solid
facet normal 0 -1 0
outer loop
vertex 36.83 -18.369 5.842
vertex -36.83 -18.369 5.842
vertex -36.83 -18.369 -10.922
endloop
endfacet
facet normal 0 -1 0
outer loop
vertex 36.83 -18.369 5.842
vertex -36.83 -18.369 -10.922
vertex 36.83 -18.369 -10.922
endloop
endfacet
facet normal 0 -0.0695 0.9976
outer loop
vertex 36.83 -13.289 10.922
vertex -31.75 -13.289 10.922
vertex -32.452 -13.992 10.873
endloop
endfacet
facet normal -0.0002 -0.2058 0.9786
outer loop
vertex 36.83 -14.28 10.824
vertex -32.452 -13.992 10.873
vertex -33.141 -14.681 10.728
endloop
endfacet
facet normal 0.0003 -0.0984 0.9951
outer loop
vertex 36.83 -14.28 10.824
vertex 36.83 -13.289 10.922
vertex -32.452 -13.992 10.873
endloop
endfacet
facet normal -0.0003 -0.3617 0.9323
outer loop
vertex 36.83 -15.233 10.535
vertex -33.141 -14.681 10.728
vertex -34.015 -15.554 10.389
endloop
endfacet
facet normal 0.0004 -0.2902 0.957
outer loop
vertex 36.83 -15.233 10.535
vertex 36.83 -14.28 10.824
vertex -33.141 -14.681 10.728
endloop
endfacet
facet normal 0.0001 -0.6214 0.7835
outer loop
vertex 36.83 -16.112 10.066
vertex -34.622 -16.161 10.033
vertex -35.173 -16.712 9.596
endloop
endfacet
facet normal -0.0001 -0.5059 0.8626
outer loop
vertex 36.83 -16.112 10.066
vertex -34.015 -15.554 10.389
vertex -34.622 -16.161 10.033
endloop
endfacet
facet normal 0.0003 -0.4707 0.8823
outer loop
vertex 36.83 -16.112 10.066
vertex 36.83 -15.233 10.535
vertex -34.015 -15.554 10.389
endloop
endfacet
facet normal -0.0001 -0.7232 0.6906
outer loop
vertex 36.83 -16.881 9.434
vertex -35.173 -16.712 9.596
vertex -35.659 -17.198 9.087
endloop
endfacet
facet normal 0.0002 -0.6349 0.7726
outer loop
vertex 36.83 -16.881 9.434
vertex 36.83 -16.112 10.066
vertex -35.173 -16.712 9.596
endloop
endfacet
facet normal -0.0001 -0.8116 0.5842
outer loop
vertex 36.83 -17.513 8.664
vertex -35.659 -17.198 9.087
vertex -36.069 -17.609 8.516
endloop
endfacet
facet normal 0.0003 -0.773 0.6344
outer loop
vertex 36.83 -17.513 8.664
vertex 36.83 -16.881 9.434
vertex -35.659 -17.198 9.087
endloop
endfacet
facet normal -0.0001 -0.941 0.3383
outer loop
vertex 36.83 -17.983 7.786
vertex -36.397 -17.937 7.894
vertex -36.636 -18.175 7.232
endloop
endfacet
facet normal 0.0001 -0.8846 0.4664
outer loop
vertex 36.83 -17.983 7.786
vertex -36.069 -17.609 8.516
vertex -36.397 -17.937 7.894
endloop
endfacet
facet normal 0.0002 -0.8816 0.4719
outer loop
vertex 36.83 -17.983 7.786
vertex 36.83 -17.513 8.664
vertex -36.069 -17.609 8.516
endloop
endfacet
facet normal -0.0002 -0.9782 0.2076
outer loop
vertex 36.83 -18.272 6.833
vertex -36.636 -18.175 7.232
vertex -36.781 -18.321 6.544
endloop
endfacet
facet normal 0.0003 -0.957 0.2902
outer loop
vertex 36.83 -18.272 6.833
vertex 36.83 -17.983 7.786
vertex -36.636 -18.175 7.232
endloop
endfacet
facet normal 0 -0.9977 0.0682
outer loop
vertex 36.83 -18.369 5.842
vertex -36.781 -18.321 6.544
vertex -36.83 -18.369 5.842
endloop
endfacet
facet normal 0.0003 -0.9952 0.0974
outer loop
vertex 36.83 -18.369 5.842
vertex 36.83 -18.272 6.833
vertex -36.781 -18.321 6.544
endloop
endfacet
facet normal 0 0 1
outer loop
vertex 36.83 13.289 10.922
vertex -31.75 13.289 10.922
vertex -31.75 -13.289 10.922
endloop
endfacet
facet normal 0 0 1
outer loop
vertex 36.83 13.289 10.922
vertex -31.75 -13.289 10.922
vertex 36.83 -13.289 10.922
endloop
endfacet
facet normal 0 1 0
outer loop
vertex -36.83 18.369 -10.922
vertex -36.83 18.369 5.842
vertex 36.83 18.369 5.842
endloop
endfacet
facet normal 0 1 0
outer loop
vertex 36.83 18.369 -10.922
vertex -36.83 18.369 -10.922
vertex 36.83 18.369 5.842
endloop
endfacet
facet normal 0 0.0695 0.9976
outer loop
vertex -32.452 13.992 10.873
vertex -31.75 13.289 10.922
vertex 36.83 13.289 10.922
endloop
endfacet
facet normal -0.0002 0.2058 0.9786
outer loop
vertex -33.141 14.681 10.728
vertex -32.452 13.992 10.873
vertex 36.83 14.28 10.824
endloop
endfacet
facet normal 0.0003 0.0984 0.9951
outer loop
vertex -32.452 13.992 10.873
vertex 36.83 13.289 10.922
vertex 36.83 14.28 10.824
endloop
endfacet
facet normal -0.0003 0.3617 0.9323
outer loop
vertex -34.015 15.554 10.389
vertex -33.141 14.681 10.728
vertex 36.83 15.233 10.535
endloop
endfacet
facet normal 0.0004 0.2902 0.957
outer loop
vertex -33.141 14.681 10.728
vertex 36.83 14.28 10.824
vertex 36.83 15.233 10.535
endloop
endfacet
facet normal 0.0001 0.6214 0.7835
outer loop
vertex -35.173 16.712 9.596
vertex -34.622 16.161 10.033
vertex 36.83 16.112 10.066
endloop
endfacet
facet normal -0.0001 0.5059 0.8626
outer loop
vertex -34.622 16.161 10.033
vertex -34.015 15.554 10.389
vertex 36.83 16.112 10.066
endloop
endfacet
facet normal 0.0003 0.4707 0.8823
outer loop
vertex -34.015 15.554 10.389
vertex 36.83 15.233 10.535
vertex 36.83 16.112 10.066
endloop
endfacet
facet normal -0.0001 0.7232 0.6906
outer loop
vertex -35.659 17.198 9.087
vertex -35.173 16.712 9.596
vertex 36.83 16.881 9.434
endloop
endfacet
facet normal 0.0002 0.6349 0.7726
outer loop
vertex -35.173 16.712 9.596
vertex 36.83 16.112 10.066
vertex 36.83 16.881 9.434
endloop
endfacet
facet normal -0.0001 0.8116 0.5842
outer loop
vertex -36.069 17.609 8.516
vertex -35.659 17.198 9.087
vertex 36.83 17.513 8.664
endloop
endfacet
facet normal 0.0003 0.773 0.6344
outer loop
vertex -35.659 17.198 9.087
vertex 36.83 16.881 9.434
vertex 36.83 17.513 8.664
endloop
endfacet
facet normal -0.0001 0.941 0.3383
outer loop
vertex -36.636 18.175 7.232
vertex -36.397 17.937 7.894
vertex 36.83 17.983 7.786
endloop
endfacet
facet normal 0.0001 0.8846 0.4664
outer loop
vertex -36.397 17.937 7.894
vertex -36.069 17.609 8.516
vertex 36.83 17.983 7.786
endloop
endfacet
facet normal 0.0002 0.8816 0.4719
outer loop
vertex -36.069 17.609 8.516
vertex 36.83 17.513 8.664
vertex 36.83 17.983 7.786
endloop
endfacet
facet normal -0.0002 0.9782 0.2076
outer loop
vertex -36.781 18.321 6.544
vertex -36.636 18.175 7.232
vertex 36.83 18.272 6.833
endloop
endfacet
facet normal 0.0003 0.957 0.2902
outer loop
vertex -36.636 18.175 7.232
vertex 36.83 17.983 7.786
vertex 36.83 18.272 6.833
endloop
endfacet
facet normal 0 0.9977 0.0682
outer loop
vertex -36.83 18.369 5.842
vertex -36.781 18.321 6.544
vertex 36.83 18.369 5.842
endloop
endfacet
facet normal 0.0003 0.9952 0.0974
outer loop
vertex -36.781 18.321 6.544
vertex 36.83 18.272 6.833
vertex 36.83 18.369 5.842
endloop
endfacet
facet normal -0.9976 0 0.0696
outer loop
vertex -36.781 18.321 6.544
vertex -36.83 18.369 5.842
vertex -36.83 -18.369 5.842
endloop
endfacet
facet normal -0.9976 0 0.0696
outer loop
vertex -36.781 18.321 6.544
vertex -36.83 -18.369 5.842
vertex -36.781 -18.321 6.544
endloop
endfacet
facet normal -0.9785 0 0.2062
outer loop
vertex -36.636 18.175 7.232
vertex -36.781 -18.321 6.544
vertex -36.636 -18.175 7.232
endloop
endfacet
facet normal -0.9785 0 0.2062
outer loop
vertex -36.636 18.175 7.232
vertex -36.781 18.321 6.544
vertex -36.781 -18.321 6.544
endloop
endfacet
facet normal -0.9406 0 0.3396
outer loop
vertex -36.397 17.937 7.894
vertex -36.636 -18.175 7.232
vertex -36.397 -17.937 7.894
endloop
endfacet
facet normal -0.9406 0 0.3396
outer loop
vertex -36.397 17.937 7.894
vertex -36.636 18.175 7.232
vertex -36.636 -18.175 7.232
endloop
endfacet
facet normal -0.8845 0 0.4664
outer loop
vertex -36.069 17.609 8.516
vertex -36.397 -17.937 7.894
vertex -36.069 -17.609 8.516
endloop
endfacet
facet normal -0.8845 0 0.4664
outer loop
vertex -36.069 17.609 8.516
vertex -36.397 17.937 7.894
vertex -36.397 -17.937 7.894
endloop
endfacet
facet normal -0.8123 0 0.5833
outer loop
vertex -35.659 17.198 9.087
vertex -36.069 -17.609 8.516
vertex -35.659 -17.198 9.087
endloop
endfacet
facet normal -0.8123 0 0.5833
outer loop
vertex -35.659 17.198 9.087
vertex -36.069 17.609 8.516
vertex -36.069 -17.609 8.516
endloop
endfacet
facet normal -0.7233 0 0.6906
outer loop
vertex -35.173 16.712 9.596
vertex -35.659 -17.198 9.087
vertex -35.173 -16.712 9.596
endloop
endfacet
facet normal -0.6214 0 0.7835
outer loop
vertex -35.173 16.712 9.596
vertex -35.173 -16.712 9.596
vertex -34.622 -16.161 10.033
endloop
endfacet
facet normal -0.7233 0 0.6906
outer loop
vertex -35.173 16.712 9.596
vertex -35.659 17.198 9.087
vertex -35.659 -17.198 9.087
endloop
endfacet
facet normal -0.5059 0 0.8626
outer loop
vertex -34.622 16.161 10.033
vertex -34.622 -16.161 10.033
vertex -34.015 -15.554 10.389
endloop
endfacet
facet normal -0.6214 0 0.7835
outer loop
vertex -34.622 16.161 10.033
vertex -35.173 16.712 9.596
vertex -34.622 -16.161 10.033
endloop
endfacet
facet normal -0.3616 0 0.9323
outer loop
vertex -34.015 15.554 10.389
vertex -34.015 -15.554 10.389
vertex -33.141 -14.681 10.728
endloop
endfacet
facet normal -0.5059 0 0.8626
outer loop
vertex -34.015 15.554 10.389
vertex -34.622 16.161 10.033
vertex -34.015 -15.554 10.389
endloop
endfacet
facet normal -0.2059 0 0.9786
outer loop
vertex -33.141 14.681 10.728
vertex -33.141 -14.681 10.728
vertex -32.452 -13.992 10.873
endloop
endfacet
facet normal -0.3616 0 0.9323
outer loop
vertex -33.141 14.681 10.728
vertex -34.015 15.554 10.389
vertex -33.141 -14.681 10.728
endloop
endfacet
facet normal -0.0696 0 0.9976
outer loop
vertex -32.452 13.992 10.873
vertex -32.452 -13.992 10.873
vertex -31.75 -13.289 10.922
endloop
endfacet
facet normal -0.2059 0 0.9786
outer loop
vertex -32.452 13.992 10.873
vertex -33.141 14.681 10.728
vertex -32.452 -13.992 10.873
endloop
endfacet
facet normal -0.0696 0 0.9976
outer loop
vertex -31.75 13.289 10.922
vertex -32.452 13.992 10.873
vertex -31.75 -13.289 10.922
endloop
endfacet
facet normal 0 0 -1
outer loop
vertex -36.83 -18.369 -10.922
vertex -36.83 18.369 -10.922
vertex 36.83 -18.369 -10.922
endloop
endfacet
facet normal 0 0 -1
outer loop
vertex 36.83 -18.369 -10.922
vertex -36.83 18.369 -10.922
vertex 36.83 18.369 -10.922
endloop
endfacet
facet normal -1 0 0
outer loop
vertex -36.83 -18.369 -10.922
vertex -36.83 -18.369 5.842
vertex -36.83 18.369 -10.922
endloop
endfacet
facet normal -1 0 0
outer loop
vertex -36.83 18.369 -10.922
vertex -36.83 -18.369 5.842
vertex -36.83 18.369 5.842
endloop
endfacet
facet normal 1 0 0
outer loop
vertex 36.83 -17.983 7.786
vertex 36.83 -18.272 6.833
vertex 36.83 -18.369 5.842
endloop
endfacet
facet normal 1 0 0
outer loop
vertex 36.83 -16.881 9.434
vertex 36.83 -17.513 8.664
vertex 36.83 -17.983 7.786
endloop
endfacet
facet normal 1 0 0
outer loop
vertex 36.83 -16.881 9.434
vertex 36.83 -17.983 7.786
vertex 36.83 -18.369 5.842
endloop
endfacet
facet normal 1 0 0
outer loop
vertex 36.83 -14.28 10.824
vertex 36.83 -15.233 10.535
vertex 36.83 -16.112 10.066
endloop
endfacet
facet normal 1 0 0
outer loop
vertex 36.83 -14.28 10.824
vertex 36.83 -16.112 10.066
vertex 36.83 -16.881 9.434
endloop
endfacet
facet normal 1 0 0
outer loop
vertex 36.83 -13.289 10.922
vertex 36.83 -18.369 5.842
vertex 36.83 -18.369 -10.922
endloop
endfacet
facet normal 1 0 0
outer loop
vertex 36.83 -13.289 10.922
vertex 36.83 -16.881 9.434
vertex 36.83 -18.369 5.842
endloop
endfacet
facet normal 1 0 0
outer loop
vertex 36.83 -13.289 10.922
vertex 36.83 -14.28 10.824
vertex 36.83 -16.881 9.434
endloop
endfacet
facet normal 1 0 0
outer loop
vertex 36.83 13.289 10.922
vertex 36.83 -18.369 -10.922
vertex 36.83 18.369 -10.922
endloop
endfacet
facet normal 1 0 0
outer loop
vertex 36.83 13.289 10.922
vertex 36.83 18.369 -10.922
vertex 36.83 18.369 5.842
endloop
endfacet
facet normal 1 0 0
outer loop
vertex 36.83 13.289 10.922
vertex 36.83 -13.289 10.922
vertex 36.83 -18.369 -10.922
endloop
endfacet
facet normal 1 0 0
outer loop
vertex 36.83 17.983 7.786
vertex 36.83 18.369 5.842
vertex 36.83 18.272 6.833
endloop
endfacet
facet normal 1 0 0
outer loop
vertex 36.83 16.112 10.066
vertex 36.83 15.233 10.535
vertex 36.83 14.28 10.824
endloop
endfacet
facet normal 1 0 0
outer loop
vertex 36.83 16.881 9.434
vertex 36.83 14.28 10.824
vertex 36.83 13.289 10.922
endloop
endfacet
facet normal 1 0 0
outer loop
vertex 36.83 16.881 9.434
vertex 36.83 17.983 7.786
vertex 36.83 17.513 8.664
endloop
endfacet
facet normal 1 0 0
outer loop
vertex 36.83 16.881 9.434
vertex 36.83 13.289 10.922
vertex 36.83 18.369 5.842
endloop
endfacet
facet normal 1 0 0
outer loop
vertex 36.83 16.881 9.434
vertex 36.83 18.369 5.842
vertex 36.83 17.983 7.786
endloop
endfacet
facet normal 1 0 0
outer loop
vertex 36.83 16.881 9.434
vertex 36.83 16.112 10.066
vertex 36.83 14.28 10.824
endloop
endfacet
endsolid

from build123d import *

# Parameters (mm, degrees)
F0_W     = 73.66
F0_H     = 36.738612
F1_DEPTH = 10.922
F2_R     = 5.08


with BuildPart() as f1:
    # F0 (on Top) → F1 (new body, symmetric)
    with BuildSketch(Plane.XY):
        Rectangle(F0_W, F0_H)
    extrude(amount=F1_DEPTH, both=True)

    # F2
    f2_edges = [f1.edges().sort_by_distance(p)[0] for p in [
        (-36.83, 0, 10.922),
        (0, -18.369306, 10.922),
        (0, 18.369306, 10.922),
    ]]
    fillet(f2_edges, radius=F2_R)


solid = f1.part
